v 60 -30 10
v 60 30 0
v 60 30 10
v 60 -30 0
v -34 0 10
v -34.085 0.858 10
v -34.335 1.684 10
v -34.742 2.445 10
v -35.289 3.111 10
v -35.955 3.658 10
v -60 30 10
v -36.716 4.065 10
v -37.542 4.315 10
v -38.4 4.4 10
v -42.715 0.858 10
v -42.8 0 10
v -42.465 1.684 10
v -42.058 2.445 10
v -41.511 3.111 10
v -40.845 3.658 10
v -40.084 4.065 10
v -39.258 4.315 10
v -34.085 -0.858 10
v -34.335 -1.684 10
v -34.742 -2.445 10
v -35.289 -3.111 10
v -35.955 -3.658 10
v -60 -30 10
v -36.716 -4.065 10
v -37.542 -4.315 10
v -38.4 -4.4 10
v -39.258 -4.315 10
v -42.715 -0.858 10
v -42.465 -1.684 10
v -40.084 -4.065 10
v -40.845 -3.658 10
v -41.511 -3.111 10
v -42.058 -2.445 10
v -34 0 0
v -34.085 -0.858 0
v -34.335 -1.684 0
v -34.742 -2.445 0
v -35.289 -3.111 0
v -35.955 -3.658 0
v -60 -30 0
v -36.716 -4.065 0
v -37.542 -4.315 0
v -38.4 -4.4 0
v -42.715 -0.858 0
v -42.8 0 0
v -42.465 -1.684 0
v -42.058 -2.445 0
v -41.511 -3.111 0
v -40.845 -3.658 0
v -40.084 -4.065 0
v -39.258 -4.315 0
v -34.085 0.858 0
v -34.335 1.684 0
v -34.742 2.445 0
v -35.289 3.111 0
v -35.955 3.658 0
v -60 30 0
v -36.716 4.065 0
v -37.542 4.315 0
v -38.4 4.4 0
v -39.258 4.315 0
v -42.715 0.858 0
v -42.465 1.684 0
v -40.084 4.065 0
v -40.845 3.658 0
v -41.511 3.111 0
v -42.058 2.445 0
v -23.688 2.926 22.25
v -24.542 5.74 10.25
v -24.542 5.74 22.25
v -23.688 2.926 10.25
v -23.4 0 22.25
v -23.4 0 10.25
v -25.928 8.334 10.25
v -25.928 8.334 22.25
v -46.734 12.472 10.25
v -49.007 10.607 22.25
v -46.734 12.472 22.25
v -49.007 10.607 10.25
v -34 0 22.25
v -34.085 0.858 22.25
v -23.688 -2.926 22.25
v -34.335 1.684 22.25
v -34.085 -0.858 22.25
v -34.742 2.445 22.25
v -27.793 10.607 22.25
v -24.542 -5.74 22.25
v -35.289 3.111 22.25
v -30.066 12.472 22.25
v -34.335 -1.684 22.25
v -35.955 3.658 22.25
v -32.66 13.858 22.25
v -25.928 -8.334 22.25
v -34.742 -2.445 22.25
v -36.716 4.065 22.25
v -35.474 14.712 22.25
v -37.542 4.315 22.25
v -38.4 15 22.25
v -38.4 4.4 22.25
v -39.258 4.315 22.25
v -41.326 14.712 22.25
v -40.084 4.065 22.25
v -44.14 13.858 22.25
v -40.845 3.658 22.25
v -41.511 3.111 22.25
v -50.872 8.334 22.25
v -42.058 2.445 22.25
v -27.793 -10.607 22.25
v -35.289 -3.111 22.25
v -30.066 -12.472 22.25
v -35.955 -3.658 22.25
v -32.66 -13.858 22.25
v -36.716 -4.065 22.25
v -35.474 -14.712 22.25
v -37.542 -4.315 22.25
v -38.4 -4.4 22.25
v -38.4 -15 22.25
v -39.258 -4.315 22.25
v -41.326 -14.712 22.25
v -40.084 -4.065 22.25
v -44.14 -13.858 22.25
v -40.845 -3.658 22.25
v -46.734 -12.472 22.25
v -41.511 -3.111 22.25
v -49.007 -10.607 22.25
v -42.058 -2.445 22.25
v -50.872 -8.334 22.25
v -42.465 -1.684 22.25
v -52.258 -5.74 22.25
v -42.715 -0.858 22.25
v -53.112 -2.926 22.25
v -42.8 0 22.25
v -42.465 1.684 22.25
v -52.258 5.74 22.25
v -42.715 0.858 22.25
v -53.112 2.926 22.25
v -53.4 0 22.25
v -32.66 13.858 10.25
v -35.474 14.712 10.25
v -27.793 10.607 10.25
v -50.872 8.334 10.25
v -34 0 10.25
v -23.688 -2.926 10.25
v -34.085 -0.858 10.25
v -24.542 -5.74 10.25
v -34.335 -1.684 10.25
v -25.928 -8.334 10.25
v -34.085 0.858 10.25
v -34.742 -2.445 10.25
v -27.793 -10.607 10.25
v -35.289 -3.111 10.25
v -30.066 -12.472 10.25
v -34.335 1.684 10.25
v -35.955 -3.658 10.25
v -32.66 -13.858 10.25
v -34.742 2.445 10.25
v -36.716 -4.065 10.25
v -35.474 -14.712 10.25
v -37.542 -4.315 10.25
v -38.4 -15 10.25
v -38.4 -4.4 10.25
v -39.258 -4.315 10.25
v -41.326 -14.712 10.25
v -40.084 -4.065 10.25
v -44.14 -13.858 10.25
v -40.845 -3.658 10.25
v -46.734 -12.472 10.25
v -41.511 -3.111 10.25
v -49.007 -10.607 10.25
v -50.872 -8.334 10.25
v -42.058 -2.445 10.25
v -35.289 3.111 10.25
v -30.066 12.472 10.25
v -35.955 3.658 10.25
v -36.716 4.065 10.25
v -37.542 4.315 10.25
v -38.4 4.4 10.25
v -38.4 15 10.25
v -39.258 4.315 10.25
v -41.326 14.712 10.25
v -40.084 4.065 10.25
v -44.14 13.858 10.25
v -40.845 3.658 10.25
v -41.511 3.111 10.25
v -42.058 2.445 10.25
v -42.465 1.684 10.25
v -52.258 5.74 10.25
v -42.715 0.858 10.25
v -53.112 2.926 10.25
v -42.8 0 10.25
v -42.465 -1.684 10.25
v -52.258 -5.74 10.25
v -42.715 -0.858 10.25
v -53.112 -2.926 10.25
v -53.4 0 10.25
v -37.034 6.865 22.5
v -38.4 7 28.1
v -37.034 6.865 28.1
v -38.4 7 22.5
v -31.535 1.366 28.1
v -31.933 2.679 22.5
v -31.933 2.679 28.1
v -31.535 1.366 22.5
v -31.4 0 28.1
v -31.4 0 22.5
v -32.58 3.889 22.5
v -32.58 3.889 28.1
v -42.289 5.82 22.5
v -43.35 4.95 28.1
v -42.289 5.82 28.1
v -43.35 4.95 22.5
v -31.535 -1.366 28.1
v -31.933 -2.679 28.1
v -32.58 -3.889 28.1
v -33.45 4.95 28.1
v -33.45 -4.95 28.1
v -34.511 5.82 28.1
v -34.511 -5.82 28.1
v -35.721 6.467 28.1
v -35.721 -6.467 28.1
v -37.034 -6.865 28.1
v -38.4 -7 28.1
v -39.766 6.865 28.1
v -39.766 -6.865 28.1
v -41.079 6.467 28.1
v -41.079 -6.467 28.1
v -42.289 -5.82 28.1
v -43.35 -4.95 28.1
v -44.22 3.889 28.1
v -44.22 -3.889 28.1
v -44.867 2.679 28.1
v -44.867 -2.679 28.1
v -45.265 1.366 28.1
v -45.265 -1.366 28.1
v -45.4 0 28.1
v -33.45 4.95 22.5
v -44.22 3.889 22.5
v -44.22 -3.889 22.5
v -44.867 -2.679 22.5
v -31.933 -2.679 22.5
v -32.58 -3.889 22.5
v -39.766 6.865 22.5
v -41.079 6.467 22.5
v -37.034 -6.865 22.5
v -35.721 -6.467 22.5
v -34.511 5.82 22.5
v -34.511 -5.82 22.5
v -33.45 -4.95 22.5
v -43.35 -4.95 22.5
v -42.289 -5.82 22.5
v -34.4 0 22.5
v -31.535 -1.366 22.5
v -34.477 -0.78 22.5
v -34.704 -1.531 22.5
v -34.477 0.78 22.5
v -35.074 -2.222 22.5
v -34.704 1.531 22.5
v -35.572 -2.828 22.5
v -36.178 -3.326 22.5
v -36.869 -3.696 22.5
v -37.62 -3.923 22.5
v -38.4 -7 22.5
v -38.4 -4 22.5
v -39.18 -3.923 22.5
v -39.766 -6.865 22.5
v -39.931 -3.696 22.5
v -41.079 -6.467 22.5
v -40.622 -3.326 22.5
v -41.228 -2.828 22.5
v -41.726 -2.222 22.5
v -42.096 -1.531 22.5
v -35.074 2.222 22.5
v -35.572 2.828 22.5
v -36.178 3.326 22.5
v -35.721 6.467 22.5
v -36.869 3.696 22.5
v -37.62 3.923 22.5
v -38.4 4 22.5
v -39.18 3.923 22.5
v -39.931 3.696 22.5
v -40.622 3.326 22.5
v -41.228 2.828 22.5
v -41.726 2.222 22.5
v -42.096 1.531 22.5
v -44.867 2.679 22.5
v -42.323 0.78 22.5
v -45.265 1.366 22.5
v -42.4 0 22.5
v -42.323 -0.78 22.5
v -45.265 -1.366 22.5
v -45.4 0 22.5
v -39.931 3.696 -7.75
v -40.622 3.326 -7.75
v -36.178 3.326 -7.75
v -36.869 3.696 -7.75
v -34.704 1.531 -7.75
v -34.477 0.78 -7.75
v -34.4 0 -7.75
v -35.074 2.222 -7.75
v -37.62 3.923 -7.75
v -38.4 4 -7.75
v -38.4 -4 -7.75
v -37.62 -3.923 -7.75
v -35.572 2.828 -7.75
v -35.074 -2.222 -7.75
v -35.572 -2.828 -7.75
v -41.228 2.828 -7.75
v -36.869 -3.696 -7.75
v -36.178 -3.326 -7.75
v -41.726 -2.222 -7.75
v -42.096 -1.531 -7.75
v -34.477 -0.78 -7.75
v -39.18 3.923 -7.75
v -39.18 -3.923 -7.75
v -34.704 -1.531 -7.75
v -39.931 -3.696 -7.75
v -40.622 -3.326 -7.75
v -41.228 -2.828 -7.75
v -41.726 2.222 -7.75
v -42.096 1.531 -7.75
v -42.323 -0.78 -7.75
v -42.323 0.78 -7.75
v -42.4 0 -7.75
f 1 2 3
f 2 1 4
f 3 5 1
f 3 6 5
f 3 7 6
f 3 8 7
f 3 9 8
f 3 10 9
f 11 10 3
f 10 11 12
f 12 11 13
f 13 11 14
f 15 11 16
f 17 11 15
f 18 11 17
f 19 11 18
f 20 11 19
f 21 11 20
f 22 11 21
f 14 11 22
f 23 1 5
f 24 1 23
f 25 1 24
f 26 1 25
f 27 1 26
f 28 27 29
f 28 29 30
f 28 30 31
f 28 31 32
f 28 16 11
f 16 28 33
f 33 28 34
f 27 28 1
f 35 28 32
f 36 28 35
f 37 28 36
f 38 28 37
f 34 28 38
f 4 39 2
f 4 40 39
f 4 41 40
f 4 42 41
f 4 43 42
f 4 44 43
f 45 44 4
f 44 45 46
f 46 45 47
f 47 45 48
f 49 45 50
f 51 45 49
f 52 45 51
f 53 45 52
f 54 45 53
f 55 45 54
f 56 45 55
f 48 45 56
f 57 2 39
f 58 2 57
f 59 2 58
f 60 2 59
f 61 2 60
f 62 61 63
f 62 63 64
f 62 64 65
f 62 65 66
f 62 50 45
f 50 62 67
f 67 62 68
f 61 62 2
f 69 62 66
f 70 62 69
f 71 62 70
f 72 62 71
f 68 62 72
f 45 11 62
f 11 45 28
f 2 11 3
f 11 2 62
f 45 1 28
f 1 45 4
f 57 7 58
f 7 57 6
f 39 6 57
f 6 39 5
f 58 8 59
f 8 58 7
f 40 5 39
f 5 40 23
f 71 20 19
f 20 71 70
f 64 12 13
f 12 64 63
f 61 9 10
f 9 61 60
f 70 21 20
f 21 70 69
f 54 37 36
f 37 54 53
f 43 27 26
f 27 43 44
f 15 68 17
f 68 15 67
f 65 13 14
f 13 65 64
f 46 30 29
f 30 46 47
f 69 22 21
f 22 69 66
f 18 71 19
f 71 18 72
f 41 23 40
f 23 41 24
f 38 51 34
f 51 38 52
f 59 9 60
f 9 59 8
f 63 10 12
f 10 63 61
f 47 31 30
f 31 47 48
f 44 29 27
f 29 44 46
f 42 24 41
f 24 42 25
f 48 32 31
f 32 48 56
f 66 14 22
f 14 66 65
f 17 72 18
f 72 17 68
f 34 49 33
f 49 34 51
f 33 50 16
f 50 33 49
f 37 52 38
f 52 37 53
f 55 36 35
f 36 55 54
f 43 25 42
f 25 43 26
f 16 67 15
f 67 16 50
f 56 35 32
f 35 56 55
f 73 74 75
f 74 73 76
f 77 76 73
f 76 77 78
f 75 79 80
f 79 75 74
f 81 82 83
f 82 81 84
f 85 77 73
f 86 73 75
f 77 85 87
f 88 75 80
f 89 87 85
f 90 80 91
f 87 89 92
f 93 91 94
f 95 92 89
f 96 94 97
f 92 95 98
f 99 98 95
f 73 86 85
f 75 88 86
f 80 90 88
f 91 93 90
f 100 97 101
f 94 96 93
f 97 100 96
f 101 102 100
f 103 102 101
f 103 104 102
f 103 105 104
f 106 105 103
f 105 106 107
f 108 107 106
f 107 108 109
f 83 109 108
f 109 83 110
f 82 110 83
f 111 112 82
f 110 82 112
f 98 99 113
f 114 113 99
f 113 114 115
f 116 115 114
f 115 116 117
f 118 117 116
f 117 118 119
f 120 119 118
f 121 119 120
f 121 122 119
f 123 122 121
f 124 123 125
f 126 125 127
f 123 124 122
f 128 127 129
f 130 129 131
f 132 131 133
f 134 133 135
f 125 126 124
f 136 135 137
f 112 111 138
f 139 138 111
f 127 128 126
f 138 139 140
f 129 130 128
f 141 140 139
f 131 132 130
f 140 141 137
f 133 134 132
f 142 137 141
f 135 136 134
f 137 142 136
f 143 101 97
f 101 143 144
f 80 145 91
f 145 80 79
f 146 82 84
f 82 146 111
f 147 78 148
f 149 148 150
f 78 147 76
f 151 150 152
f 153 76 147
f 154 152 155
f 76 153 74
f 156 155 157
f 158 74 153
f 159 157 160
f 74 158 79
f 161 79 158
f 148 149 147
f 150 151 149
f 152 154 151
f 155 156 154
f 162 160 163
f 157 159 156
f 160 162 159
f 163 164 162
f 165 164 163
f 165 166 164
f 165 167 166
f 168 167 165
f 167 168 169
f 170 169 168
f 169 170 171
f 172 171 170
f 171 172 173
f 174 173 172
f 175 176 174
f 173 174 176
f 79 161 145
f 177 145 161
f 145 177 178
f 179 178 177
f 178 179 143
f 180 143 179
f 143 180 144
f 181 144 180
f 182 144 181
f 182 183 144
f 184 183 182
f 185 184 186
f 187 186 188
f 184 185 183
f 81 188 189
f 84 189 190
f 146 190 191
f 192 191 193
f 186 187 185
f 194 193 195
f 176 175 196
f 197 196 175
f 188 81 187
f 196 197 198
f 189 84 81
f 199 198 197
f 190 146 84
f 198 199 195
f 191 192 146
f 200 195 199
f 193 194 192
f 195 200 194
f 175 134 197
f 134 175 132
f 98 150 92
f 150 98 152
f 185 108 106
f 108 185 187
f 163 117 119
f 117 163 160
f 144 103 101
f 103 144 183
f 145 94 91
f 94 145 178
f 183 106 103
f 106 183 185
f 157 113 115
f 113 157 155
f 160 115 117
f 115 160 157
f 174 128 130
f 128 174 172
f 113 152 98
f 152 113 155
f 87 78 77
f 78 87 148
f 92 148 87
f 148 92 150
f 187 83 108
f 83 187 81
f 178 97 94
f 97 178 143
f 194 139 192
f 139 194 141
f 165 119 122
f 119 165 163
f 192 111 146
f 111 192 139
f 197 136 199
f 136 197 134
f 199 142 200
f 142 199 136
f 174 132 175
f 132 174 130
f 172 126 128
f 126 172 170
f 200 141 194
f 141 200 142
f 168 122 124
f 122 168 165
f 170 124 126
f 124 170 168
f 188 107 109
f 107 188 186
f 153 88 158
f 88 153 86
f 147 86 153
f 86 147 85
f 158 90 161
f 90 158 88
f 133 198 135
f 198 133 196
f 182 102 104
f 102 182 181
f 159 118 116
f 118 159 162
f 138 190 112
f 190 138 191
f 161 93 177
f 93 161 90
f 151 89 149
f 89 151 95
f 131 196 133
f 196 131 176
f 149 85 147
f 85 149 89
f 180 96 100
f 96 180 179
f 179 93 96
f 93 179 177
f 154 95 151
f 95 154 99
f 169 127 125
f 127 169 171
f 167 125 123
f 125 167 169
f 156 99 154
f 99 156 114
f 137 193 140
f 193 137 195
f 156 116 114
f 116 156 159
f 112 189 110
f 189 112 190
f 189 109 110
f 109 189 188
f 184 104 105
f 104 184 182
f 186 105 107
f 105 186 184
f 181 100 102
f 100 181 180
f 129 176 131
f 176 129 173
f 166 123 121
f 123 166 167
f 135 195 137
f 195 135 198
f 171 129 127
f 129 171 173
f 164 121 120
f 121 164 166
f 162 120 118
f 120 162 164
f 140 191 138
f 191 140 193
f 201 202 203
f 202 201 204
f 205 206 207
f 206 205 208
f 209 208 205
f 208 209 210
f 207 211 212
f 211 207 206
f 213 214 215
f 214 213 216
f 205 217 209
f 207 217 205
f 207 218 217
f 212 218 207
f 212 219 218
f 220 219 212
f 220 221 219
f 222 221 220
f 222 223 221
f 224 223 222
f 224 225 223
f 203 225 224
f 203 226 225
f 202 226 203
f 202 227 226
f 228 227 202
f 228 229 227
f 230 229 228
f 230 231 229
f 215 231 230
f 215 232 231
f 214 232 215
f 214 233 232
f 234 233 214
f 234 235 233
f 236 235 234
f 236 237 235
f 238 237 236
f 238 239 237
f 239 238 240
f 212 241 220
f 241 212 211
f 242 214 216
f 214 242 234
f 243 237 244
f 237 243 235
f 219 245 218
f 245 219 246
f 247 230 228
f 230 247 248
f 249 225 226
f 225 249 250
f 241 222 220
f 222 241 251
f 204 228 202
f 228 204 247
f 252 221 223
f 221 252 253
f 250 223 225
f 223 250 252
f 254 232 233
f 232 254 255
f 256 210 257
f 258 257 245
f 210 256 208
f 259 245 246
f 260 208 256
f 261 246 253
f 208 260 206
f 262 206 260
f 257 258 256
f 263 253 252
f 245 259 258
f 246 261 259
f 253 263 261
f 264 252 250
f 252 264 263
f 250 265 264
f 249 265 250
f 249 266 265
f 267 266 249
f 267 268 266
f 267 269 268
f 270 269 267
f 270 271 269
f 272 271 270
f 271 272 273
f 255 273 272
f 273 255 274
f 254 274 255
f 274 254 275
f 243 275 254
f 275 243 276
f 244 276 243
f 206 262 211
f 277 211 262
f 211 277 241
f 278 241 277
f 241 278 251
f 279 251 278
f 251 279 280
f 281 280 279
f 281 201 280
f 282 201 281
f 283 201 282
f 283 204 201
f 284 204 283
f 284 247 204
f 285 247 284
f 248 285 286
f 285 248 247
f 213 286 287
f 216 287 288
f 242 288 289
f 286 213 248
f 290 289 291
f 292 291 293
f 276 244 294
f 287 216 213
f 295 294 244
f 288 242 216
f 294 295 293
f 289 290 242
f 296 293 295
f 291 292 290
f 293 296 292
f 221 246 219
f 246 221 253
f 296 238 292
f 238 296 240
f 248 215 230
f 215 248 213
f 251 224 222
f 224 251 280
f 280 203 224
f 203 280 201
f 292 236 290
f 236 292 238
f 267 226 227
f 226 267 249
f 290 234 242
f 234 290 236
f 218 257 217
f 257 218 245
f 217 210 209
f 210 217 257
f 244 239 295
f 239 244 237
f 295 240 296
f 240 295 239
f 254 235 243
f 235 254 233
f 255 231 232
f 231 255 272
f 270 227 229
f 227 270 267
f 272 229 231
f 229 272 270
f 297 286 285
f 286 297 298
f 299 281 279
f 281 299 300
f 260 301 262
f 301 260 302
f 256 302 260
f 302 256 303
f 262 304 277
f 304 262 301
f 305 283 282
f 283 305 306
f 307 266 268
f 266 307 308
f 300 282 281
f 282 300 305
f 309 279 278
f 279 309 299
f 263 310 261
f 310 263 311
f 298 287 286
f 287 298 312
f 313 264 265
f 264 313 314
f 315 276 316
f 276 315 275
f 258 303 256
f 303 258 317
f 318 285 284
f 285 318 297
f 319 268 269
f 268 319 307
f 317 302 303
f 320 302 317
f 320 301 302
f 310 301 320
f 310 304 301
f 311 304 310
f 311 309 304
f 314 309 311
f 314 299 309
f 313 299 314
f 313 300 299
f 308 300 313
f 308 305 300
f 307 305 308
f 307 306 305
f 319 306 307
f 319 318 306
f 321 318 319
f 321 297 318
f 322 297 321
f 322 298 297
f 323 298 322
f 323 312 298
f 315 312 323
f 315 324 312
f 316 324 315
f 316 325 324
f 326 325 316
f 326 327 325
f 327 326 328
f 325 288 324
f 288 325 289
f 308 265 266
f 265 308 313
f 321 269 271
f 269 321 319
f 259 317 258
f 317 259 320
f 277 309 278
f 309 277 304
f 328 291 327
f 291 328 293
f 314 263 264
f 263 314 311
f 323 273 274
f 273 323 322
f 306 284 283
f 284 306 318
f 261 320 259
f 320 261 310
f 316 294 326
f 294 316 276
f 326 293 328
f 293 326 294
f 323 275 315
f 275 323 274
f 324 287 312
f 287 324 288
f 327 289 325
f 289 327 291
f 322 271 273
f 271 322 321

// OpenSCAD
$fn = 32;

// ------------------------------------------------------------------------
// Standoff columns: 1 d30 standoffs, bolts d8
// Every part is its own module, assembly() places them once.
// ------------------------------------------------------------------------

// --- part 1 ---
module base_plate() {
  difference() {
    translate([-60, -30, 0]) cube([120, 60, 10]);
    translate([-38.4, 0, -1]) cylinder(h = 12, d = 8.8);
  }
}

// --- part 2 ---
module spacer() {
  difference() {
      translate([0, 0, 0]) cylinder(h = 12, d = 30);
      translate([0, 0, -1]) cylinder(h = 14, d = 8.8);
    }
}

// --- part 3 ---
module bolt() {
  cylinder(h = 5.6, d = 14);
  translate([0, 0, -30.25]) cylinder(h = 30.25, d = 8);
}

// --- assembly ---
module assembly() {
  translate([0, 0, 0]) rotate([0, 0, 0]) base_plate();
  translate([-38.4, 0, 10.25]) rotate([0, 0, 0]) spacer();
  translate([-38.4, 0, 22.5]) rotate([0, 0, 0]) bolt();
}

assembly();
